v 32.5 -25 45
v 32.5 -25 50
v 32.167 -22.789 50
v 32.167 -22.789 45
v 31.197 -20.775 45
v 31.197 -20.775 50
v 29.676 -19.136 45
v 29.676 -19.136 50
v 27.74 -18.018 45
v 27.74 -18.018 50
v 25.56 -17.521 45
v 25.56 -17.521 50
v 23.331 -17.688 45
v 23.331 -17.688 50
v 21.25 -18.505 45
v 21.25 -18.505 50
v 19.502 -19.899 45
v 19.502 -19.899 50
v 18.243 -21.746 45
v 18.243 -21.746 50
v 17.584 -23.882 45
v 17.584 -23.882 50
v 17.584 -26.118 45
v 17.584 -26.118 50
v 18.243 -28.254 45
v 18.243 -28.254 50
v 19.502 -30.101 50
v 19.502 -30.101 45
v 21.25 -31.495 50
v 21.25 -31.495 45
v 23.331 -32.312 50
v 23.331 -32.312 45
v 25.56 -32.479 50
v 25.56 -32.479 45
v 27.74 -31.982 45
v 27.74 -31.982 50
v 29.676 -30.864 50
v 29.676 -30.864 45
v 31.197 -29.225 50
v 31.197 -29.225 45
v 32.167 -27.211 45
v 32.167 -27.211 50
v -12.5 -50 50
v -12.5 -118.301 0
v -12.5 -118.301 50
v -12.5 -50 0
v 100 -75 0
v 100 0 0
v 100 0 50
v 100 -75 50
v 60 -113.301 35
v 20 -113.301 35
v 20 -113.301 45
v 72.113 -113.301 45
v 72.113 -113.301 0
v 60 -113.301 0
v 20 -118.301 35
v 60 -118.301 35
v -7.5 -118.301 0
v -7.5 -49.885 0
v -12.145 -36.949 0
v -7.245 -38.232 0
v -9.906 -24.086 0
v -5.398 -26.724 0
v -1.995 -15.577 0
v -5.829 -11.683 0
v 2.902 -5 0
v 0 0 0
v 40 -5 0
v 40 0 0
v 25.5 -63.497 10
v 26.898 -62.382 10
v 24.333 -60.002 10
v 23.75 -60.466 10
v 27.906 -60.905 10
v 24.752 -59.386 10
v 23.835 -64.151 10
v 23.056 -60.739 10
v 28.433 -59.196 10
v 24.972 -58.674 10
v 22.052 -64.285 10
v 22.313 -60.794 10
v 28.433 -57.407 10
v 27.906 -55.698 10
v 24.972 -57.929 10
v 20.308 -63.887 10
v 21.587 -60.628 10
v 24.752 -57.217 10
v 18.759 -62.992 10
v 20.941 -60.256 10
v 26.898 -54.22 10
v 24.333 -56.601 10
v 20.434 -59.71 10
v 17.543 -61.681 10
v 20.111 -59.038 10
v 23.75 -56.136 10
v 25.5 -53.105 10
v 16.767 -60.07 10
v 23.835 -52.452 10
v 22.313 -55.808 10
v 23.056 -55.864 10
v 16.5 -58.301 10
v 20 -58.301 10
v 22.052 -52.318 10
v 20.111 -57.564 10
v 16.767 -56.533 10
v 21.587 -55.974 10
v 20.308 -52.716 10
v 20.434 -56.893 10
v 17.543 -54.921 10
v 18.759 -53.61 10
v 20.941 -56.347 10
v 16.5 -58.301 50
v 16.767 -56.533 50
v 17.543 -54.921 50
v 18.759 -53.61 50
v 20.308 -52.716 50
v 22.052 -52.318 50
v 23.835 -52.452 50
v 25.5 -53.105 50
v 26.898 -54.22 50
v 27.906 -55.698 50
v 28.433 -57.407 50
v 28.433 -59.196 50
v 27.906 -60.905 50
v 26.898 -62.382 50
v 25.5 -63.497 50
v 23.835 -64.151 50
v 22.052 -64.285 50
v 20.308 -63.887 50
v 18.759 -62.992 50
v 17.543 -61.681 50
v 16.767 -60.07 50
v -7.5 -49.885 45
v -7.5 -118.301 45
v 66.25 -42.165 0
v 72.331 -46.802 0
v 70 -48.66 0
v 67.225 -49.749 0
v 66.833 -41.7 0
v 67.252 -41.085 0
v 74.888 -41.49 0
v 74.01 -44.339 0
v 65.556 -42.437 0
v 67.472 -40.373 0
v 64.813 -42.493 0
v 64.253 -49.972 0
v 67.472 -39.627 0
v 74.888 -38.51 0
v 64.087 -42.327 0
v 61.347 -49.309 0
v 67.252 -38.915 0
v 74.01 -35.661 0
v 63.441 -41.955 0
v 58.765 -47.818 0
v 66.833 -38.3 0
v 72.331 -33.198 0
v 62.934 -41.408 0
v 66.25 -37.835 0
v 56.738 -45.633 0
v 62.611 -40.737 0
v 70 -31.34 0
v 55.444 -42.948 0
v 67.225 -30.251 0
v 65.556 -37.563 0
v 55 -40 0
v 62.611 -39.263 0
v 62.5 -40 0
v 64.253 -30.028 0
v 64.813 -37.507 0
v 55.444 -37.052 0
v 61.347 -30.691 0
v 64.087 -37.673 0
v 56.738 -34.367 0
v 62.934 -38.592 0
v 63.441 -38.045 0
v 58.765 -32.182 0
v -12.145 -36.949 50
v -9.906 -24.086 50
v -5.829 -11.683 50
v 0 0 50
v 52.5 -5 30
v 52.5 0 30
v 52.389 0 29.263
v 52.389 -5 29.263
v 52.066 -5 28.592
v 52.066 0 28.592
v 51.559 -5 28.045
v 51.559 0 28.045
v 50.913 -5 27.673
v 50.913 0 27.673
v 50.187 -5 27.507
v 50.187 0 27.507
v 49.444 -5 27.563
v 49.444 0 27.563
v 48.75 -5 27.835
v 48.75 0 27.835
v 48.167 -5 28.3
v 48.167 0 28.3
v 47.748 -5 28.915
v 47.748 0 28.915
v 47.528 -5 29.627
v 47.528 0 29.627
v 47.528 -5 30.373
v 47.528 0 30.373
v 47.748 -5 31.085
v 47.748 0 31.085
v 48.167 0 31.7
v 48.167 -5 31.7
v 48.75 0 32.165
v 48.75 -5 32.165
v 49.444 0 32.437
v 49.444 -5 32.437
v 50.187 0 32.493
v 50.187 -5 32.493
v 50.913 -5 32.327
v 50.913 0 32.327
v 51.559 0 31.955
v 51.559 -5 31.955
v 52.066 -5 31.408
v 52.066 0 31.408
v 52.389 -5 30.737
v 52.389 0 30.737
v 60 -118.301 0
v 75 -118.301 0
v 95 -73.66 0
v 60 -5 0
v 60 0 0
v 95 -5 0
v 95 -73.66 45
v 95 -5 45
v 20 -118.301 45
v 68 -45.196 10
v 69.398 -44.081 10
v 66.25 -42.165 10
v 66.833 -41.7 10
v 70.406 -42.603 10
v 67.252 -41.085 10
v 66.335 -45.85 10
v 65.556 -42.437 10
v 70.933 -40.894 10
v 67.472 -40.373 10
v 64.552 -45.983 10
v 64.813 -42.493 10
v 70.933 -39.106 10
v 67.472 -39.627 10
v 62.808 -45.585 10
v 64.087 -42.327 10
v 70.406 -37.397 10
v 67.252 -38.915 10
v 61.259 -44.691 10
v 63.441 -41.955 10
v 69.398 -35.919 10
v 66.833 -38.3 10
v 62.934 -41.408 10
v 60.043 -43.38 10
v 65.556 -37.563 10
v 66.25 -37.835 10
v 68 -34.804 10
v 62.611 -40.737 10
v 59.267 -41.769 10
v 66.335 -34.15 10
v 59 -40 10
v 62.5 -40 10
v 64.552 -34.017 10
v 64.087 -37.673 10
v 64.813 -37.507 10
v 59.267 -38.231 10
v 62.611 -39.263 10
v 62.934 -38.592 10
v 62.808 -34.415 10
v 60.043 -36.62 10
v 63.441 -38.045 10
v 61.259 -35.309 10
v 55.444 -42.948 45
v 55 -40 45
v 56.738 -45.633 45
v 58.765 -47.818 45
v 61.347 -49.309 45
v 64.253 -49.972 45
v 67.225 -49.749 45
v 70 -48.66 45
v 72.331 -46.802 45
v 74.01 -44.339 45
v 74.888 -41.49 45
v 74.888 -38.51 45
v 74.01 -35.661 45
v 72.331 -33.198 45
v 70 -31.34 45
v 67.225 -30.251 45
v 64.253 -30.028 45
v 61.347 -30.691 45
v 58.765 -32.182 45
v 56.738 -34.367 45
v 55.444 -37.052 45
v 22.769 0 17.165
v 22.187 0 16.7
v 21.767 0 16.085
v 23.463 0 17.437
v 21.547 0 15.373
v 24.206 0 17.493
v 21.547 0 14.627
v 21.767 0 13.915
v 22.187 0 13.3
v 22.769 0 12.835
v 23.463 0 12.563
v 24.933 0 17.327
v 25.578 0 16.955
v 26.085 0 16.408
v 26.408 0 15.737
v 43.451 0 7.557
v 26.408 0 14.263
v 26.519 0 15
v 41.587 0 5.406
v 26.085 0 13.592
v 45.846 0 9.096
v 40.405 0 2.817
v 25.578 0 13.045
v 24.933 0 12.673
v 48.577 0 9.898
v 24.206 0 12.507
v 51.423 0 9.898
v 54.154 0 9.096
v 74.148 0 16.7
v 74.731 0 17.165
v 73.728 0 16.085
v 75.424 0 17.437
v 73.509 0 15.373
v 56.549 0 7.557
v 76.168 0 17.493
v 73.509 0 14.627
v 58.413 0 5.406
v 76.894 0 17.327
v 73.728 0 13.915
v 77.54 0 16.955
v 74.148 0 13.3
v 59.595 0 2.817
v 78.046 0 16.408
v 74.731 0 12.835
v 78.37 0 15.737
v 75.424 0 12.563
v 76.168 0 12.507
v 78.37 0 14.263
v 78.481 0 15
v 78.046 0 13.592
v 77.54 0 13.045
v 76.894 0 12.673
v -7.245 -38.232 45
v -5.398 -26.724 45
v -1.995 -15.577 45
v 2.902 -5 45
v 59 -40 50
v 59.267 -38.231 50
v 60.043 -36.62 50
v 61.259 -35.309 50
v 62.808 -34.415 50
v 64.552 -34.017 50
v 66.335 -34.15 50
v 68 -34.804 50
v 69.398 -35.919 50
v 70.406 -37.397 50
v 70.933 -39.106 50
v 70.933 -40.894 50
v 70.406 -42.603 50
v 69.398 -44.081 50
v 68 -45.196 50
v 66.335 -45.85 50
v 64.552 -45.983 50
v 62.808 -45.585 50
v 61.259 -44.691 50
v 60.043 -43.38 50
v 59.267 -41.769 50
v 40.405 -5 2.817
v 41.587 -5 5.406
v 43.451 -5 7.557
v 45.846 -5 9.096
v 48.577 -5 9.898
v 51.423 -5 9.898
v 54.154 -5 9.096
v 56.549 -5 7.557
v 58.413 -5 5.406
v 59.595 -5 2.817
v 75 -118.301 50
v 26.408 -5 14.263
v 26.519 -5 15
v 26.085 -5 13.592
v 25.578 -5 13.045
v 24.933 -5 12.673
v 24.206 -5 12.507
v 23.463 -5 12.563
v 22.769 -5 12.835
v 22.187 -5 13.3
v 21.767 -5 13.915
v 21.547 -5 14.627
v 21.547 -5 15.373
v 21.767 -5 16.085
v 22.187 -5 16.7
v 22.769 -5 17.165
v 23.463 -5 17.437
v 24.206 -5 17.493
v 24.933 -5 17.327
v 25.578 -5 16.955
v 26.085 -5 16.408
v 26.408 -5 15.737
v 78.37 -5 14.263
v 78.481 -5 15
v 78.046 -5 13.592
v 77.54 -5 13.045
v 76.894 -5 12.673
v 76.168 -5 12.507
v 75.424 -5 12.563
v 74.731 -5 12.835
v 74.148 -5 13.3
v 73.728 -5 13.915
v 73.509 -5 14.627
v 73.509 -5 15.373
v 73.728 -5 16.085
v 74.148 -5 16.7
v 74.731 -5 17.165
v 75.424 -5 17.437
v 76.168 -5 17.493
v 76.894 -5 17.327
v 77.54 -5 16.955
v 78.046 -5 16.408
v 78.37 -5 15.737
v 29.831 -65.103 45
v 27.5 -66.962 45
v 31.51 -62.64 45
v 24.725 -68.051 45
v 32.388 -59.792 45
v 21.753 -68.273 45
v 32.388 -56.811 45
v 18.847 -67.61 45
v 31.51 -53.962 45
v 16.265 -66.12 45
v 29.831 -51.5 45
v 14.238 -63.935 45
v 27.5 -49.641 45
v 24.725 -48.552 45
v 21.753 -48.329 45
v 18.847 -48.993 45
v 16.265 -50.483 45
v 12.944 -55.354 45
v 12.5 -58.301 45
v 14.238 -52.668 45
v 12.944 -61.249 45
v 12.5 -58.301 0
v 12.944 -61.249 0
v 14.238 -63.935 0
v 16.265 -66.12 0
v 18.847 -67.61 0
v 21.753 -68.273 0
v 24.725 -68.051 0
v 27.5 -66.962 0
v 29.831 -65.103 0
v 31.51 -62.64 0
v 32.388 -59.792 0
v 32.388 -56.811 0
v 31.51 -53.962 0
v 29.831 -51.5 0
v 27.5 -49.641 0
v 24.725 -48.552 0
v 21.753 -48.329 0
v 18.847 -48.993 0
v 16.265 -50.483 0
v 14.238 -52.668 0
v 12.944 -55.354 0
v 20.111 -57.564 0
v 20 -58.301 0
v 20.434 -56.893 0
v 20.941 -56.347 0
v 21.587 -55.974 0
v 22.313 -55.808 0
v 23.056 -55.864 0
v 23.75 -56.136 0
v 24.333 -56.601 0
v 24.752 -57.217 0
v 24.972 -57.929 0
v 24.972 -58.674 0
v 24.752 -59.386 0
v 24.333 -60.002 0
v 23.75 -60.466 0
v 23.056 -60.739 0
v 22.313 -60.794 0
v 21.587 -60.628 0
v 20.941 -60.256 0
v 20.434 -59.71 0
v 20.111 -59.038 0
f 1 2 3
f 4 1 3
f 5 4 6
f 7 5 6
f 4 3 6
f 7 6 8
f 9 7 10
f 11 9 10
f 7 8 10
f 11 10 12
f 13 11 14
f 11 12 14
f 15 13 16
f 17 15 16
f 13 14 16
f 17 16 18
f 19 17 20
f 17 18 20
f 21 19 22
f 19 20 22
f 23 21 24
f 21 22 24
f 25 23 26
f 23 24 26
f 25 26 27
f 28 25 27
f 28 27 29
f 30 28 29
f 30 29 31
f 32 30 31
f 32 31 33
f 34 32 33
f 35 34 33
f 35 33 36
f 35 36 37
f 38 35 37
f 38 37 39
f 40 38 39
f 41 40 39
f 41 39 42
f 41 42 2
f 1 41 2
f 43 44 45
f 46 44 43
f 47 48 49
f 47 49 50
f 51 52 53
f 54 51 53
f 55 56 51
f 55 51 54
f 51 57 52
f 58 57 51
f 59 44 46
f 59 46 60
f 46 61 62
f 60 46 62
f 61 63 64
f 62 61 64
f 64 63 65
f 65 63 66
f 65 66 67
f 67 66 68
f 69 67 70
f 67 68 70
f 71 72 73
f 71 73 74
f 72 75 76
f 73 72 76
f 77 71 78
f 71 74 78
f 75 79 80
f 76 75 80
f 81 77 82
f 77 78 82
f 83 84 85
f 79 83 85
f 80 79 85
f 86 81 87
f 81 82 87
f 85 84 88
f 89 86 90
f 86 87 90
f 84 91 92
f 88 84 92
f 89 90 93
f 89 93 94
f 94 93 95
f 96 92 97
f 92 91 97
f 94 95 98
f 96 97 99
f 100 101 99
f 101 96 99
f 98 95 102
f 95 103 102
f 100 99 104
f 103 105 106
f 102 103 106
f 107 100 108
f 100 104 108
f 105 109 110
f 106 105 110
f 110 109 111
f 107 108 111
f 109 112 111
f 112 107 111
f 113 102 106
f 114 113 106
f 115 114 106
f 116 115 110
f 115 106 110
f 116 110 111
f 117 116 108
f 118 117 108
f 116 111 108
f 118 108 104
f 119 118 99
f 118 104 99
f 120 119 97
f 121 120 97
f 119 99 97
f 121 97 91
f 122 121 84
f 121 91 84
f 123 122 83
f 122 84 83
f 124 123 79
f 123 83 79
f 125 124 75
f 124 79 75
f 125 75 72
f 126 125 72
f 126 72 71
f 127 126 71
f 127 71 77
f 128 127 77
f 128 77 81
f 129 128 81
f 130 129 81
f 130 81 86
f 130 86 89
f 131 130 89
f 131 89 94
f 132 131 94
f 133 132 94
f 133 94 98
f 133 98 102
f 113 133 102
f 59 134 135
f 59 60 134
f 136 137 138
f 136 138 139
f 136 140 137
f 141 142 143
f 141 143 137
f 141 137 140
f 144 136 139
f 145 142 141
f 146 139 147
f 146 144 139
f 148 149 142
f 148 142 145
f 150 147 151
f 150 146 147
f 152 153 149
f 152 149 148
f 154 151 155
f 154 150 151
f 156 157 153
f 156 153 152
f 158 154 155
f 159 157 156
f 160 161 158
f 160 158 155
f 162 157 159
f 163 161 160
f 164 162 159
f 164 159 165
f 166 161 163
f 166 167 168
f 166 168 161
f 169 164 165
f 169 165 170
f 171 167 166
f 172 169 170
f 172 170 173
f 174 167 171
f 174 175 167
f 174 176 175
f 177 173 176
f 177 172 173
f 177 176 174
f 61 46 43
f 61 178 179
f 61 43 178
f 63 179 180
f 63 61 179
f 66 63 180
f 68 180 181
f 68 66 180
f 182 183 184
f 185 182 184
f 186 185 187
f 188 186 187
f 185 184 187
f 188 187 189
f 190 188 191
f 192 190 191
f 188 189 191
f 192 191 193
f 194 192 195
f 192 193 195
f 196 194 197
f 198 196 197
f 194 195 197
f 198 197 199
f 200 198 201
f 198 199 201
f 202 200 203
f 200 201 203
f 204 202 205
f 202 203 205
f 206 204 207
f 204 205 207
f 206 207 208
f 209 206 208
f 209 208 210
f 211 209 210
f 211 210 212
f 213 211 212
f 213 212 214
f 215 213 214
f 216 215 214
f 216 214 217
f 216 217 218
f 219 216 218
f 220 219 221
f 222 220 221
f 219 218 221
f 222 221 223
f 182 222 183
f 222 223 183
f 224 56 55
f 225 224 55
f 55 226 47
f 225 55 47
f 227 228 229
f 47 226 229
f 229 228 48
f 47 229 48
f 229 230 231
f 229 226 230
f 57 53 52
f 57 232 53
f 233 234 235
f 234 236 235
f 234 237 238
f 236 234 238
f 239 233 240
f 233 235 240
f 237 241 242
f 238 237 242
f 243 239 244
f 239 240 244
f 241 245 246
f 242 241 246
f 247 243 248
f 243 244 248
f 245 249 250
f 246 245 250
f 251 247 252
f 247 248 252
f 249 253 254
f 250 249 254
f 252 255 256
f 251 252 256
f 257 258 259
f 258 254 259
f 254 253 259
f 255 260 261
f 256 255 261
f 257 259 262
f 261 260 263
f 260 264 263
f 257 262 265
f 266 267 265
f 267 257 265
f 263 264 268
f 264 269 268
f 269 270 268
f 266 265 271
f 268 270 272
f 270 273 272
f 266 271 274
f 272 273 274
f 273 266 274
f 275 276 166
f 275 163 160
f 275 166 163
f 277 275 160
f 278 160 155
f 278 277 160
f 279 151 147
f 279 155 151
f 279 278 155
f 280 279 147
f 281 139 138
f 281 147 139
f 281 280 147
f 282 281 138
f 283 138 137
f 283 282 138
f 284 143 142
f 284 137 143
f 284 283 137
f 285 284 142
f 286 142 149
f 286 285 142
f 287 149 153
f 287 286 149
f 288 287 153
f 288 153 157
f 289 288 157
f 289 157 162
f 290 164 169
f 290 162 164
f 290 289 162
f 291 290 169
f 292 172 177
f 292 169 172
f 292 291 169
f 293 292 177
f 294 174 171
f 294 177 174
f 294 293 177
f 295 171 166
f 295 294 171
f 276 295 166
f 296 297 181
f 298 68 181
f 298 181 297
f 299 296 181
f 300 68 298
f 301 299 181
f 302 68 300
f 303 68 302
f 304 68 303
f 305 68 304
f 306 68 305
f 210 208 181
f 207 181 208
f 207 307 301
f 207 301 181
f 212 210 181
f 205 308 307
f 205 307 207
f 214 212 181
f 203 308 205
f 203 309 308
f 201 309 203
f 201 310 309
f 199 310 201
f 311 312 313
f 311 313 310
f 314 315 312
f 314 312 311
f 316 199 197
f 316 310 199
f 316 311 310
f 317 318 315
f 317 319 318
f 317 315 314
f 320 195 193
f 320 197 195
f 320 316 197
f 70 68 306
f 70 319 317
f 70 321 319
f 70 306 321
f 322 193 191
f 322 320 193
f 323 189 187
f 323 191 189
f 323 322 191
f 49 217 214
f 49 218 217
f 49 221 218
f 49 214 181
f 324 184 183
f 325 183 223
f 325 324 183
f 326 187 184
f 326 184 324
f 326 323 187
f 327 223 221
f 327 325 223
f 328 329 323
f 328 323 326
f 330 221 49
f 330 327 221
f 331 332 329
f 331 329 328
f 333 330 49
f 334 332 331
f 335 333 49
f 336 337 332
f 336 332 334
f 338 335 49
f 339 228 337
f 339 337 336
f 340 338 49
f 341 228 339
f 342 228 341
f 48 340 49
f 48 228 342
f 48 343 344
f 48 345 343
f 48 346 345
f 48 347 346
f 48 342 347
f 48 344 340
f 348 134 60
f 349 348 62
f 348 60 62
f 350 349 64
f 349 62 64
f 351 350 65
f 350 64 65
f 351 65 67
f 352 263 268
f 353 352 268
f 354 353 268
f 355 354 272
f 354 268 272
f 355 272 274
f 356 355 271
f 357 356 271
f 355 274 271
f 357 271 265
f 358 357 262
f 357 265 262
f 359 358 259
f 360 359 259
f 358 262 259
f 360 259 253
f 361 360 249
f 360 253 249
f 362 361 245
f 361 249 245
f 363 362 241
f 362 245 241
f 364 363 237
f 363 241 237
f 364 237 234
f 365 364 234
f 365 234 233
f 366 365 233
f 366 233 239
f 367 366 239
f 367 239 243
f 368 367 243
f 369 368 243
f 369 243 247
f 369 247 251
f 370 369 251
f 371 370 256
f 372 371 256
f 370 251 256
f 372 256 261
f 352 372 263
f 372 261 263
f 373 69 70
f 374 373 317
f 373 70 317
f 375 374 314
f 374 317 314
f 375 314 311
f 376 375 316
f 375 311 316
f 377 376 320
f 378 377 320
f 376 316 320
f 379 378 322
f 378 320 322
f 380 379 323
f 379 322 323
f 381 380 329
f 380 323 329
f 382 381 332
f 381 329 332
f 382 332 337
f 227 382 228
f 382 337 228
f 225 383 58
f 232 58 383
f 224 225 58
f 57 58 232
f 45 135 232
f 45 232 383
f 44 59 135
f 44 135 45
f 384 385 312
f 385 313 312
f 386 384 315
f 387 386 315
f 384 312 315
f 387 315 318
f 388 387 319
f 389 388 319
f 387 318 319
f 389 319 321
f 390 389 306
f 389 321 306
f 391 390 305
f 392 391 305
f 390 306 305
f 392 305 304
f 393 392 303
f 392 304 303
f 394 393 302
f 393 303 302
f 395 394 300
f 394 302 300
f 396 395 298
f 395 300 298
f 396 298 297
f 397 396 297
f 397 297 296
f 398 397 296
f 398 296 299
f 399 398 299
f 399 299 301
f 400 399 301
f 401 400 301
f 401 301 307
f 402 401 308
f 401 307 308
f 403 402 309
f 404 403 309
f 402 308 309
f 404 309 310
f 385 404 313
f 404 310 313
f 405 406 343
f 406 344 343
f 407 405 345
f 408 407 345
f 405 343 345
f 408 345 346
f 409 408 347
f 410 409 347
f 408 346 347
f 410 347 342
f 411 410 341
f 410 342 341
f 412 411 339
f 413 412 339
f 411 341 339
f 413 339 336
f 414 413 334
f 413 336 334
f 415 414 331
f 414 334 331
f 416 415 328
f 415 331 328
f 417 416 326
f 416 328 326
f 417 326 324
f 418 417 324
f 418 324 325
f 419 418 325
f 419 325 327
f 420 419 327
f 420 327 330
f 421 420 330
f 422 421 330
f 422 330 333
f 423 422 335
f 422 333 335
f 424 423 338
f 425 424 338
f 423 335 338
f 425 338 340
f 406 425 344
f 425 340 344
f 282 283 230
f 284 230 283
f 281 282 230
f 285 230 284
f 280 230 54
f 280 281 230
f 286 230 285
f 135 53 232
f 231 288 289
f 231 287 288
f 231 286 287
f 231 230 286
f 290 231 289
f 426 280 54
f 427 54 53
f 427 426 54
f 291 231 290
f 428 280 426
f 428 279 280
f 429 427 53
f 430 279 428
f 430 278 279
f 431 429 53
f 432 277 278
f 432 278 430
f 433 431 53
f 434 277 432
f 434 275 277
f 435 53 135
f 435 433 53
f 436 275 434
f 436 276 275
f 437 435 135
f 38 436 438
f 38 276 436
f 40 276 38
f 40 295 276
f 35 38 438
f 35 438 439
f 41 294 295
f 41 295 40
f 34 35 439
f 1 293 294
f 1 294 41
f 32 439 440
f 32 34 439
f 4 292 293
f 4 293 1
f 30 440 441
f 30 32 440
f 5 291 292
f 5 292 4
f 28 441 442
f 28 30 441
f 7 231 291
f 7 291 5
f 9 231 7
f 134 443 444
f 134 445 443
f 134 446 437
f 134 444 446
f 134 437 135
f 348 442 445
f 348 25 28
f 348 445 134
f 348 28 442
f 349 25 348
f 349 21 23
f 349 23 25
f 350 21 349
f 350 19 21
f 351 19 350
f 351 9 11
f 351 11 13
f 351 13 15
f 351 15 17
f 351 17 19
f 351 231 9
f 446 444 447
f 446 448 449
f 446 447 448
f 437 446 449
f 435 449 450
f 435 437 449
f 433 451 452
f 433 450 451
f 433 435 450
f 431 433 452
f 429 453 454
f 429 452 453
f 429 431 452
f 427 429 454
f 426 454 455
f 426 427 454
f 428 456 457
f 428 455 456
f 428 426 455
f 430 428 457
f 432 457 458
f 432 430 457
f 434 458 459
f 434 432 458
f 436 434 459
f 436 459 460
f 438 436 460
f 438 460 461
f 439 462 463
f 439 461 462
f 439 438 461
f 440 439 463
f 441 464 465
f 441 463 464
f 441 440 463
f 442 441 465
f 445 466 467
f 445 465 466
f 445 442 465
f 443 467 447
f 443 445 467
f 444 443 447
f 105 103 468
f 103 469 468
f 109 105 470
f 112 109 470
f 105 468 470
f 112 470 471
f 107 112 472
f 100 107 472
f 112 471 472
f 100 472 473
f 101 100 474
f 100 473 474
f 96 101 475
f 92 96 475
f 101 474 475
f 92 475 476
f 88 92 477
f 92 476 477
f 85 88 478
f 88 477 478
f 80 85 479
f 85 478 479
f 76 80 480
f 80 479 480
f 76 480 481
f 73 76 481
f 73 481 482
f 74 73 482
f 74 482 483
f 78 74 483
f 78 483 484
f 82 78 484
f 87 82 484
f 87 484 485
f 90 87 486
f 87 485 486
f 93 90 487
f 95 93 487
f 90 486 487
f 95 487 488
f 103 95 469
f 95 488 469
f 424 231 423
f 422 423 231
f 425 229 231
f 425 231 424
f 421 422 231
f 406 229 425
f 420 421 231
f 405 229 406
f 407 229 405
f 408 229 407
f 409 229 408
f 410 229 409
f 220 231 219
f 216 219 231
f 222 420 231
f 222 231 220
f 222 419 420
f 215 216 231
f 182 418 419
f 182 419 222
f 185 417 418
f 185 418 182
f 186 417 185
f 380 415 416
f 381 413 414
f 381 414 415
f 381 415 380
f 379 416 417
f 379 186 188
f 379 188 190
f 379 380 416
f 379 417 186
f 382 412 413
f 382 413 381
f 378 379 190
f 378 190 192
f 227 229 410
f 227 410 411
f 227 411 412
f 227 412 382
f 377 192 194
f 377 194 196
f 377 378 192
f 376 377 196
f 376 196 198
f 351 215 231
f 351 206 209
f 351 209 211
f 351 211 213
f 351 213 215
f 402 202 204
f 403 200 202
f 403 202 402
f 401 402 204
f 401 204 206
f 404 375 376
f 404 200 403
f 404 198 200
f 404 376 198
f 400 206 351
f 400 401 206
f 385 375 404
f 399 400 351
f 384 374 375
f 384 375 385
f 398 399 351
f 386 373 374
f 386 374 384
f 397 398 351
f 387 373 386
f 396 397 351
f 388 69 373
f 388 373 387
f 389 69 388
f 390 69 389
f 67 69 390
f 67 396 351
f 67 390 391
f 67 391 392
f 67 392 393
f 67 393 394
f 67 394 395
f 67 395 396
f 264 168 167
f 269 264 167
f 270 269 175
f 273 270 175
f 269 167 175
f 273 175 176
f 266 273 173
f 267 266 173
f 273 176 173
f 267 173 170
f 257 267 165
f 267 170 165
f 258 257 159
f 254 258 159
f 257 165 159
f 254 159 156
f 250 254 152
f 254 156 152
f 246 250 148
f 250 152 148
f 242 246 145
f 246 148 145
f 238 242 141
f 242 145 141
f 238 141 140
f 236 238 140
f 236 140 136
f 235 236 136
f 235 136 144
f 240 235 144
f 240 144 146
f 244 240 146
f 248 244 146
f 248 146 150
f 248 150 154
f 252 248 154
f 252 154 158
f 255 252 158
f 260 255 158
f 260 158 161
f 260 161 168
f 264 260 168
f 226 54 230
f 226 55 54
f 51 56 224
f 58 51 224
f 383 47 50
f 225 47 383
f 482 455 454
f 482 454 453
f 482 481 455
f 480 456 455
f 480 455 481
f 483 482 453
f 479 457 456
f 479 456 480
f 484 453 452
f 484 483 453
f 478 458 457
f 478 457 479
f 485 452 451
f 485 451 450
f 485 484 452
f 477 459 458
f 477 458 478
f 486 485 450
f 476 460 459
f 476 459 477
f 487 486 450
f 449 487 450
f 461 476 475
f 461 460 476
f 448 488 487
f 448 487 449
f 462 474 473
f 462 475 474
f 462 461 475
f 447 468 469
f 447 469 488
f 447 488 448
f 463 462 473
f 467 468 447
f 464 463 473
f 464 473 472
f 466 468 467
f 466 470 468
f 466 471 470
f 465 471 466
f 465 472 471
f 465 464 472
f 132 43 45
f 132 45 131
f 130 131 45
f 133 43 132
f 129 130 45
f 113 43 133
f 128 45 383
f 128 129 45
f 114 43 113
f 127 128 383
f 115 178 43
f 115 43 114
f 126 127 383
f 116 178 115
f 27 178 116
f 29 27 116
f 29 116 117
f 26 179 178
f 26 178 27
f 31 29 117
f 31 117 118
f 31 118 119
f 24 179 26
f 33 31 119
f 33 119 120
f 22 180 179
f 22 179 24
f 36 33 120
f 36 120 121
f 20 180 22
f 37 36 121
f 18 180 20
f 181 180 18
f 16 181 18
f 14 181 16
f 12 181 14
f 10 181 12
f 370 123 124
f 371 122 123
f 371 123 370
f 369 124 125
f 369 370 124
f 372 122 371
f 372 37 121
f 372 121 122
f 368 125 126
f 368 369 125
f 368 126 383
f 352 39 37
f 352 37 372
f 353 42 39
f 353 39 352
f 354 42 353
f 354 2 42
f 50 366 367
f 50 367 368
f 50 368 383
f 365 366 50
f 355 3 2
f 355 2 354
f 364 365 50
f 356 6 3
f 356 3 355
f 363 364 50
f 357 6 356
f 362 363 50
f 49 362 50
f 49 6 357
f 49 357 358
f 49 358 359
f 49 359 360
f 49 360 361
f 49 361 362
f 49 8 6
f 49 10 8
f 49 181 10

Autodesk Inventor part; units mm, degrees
ref_plane "YZ Plane" through (0, 0, 0) normal (1, 0, 0) x (0, 1, 0)
ref_plane "XZ Plane" through (0, 0, 0) normal (0, 1, 0) x (-1, 0, 0)
ref_plane "XY Plane" through (0, 0, 0) normal (0, 0, 1) x (1, 0, 0)
sketch "Sketch1" plane through (0, 0, 0) normal (0, 0, 1) x (1, 0, 0)
  line L0 (0, 0) -> (100, 0)
  line L1 (100, 0) -> (100, -75)
  line L2 (100, -75) -> (75, -118.3013)
  line L3 (75, -118.3013) -> (-12.5, -118.3013)
  line L4 (-12.5, -118.3013) -> (-12.5, -50)
  arc A0 (0, 0) -> (-12.5, -50) centre (77.4072, -45.9143) ccw
  dimension "d0" = 100
  dimension "d1" = 75
  dimension "d2" = 50
  dimension "d3" = 150
  dimension "d5" = 50
  dimension "d6" = 12.5
  dimension "d7" = 90
extrude "Extrusion1" add sketch "Sketch1" along normal blind 50
sketch "Sketch2" plane through (0, 0, 0) normal (0, 0, -1) x (-1, 0, 0)
  line L0 (0, 0) -> (-100, 0) projected
  line L1 (-100, 0) -> (-100, -75) projected
  line L2 (-100, -75) -> (-75, -118.3013) projected
  line L3 (-75, -118.3013) -> (12.5, -118.3013) projected
  line L4 (12.5, -118.3013) -> (12.5, -50) projected
  arc A0 (12.5, -50) -> (0, 0) centre (-77.4072, -45.9143) ccw projected
  line L5 (-95, -73.6603) -> (-95, -5)
  line L6 (-95, -5) -> (-2.902, -5)
  arc A1 (7.5, -49.8848) -> (-2.902, -5) centre (-77.4072, -45.9143) ccw
  line L7 (7.5, -49.8848) -> (7.5, -113.3013)
  line L8 (7.5, -113.3013) -> (-72.1132, -113.3013)
  line L9 (-72.1132, -113.3013) -> (-95, -73.6603)
  dimension "d10" = 5
extrude "Extrusion2" cut sketch "Sketch2" against normal blind 45 contours L5 L6 A1 L7 L8 L9
sketch "Sketch3" plane through (0, 0, 0) normal (0, 0, -1) x (-1, 0, 0)
  line L0 (7.5, -113.3013) -> (-72.1132, -113.3013) projected
  line L1 (12.5, -118.3013) -> (-75, -118.3013) projected
  line L2 (7.5, -113.3013) -> (-60, -113.3013)
  line L3 (-60, -113.3013) -> (-60, -118.3013)
  line L4 (-60, -118.3013) -> (7.5, -118.3013)
  line L5 (7.5, -118.3013) -> (7.5, -113.3013)
  point P0 (0, 0)
  dimension "d13" = 15
extrude "Extrusion3" cut sketch "Sketch3" against normal blind 45
sketch "Sketch4" plane through (0, 0, 0) normal (0, 1, 0) x (1, 0, 0)
  circle A0 centre (50, 0) radius 10
  line L0 (0, 0) -> (100, 0) projected
  dimension "d16" = 20
extrude "Extrusion4" cut sketch "Sketch4" against normal through all
sketch "Sketch5" plane through (0, 0, 50) normal (0, 1, 0) x (1, 0, 0)
  arc A0 (40, 50) -> (60, 50) centre (50, 50) ccw projected
  circle A1 centre (50, 50) radius 30 construction
  circle A2 centre (50, 20) radius 2.5
  circle A3 centre (75.9808, 35) radius 2.5
  circle A4 centre (75.9808, 65) radius 2.5
  circle A5 centre (50, 80) radius 2.5
  circle A6 centre (24.0192, 65) radius 2.5
  circle A7 centre (24.0192, 35) radius 2.5
  point P0 (0, 50)
  dimension "d19" = 60
  dimension "d20" = 5
  dimension "d23" = 360
extrude "Extrusion5" cut sketch "Sketch5" against normal blind 5 contours A2 | A3 | A7
sketch "Sketch6" plane through (0, 0, 50) normal (0, 0, 1) x (1, 0, 0)
  circle A0 centre (25, -25) radius 7.5
  point P0 (0, 0)
  dimension "d27" = 15
  dimension "d28" = 25
  dimension "d29" = 25
extrude "Extrusion6" cut sketch "Sketch6" against normal blind 5
sketch "Sketch7" plane through (-12.5, -118.3013, 50) normal (0, -1, 0) x (1, 0, 0)
  line L0 (87.5, 0) -> (112.5, 0) projected
  line L1 (87.5, 0) -> (32.5, 0)
  line L2 (32.5, 0) -> (32.5, -15)
  line L3 (32.5, -15) -> (87.5, -15)
  line L4 (87.5, -15) -> (87.5, 0)
  line L5 (0, -50) -> (0, 0) projected
  point P0 (12.5, -50)
  dimension "d32" = 15
  dimension "d33" = 32.5
extrude "Extrusion7" add sketch "Sketch7" against normal blind 5
sketch "Sketch9" plane through (0, 0, 0) normal (0, 0, -1) x (-1, 0, 0)
  circle A0 centre (-65, -40) radius 6
  circle A1 centre (-22.5, -58.3013) radius 6
  line L0 (-100, 0) -> (-100, -75) projected
  line L1 (-60, 0) -> (-100, 0) projected
  line L2 (12.5, -118.3013) -> (12.5, -50) projected
  line L3 (7.5, -118.3013) -> (-20, -118.3013) projected
  point P0 (0, 0)
  point P1 (-57.5, 0)
  dimension "d39" = 12
  dimension "d40" = 12
  dimension "d41" = 35
  dimension "d42" = 40
  dimension "d43" = 35
  dimension "d44" = 60
extrude "Extrusion9" cut sketch "Sketch9" against normal through all
sketch "Sketch10" plane through (0, 0, 45) normal (0, 0, -1) x (-1, 0, 0)
  circle A0 centre (-65, -40) radius 6 projected
  circle A1 centre (-22.5, -58.3013) radius 6 projected
  circle A2 centre (-22.5, -58.3013) radius 10
  circle A3 centre (-65, -40) radius 10
  point P0 (0, 0)
  dimension "d47" = 20
  dimension "d48" = 20
extrude "Extrusion10" add sketch "Sketch10" along normal blind 45
sketch "Sketch11" plane through (65, -40, 0) normal (0, 0, -1) x (-1, 0, 0)
  circle A0 centre (0, 0) radius 10 projected
  circle A1 centre (42.5, -18.3013) radius 10 projected
  circle A2 centre (42.5, -18.3013) radius 6 projected
  circle A3 centre (0, 0) radius 6 projected
  circle A4 centre (42.5, -18.3013) radius 2.5
  circle A5 centre (0, 0) radius 6 projected
  circle A6 centre (0, 0) radius 2.5
  point P0 (65, 40)
  dimension "d51" = 5
  dimension "d52" = 5
extrude "Extrusion11" add sketch "Sketch11" against normal blind 10 contours A2 | A3
properties part number "FA002" material "ABS Plastic"
